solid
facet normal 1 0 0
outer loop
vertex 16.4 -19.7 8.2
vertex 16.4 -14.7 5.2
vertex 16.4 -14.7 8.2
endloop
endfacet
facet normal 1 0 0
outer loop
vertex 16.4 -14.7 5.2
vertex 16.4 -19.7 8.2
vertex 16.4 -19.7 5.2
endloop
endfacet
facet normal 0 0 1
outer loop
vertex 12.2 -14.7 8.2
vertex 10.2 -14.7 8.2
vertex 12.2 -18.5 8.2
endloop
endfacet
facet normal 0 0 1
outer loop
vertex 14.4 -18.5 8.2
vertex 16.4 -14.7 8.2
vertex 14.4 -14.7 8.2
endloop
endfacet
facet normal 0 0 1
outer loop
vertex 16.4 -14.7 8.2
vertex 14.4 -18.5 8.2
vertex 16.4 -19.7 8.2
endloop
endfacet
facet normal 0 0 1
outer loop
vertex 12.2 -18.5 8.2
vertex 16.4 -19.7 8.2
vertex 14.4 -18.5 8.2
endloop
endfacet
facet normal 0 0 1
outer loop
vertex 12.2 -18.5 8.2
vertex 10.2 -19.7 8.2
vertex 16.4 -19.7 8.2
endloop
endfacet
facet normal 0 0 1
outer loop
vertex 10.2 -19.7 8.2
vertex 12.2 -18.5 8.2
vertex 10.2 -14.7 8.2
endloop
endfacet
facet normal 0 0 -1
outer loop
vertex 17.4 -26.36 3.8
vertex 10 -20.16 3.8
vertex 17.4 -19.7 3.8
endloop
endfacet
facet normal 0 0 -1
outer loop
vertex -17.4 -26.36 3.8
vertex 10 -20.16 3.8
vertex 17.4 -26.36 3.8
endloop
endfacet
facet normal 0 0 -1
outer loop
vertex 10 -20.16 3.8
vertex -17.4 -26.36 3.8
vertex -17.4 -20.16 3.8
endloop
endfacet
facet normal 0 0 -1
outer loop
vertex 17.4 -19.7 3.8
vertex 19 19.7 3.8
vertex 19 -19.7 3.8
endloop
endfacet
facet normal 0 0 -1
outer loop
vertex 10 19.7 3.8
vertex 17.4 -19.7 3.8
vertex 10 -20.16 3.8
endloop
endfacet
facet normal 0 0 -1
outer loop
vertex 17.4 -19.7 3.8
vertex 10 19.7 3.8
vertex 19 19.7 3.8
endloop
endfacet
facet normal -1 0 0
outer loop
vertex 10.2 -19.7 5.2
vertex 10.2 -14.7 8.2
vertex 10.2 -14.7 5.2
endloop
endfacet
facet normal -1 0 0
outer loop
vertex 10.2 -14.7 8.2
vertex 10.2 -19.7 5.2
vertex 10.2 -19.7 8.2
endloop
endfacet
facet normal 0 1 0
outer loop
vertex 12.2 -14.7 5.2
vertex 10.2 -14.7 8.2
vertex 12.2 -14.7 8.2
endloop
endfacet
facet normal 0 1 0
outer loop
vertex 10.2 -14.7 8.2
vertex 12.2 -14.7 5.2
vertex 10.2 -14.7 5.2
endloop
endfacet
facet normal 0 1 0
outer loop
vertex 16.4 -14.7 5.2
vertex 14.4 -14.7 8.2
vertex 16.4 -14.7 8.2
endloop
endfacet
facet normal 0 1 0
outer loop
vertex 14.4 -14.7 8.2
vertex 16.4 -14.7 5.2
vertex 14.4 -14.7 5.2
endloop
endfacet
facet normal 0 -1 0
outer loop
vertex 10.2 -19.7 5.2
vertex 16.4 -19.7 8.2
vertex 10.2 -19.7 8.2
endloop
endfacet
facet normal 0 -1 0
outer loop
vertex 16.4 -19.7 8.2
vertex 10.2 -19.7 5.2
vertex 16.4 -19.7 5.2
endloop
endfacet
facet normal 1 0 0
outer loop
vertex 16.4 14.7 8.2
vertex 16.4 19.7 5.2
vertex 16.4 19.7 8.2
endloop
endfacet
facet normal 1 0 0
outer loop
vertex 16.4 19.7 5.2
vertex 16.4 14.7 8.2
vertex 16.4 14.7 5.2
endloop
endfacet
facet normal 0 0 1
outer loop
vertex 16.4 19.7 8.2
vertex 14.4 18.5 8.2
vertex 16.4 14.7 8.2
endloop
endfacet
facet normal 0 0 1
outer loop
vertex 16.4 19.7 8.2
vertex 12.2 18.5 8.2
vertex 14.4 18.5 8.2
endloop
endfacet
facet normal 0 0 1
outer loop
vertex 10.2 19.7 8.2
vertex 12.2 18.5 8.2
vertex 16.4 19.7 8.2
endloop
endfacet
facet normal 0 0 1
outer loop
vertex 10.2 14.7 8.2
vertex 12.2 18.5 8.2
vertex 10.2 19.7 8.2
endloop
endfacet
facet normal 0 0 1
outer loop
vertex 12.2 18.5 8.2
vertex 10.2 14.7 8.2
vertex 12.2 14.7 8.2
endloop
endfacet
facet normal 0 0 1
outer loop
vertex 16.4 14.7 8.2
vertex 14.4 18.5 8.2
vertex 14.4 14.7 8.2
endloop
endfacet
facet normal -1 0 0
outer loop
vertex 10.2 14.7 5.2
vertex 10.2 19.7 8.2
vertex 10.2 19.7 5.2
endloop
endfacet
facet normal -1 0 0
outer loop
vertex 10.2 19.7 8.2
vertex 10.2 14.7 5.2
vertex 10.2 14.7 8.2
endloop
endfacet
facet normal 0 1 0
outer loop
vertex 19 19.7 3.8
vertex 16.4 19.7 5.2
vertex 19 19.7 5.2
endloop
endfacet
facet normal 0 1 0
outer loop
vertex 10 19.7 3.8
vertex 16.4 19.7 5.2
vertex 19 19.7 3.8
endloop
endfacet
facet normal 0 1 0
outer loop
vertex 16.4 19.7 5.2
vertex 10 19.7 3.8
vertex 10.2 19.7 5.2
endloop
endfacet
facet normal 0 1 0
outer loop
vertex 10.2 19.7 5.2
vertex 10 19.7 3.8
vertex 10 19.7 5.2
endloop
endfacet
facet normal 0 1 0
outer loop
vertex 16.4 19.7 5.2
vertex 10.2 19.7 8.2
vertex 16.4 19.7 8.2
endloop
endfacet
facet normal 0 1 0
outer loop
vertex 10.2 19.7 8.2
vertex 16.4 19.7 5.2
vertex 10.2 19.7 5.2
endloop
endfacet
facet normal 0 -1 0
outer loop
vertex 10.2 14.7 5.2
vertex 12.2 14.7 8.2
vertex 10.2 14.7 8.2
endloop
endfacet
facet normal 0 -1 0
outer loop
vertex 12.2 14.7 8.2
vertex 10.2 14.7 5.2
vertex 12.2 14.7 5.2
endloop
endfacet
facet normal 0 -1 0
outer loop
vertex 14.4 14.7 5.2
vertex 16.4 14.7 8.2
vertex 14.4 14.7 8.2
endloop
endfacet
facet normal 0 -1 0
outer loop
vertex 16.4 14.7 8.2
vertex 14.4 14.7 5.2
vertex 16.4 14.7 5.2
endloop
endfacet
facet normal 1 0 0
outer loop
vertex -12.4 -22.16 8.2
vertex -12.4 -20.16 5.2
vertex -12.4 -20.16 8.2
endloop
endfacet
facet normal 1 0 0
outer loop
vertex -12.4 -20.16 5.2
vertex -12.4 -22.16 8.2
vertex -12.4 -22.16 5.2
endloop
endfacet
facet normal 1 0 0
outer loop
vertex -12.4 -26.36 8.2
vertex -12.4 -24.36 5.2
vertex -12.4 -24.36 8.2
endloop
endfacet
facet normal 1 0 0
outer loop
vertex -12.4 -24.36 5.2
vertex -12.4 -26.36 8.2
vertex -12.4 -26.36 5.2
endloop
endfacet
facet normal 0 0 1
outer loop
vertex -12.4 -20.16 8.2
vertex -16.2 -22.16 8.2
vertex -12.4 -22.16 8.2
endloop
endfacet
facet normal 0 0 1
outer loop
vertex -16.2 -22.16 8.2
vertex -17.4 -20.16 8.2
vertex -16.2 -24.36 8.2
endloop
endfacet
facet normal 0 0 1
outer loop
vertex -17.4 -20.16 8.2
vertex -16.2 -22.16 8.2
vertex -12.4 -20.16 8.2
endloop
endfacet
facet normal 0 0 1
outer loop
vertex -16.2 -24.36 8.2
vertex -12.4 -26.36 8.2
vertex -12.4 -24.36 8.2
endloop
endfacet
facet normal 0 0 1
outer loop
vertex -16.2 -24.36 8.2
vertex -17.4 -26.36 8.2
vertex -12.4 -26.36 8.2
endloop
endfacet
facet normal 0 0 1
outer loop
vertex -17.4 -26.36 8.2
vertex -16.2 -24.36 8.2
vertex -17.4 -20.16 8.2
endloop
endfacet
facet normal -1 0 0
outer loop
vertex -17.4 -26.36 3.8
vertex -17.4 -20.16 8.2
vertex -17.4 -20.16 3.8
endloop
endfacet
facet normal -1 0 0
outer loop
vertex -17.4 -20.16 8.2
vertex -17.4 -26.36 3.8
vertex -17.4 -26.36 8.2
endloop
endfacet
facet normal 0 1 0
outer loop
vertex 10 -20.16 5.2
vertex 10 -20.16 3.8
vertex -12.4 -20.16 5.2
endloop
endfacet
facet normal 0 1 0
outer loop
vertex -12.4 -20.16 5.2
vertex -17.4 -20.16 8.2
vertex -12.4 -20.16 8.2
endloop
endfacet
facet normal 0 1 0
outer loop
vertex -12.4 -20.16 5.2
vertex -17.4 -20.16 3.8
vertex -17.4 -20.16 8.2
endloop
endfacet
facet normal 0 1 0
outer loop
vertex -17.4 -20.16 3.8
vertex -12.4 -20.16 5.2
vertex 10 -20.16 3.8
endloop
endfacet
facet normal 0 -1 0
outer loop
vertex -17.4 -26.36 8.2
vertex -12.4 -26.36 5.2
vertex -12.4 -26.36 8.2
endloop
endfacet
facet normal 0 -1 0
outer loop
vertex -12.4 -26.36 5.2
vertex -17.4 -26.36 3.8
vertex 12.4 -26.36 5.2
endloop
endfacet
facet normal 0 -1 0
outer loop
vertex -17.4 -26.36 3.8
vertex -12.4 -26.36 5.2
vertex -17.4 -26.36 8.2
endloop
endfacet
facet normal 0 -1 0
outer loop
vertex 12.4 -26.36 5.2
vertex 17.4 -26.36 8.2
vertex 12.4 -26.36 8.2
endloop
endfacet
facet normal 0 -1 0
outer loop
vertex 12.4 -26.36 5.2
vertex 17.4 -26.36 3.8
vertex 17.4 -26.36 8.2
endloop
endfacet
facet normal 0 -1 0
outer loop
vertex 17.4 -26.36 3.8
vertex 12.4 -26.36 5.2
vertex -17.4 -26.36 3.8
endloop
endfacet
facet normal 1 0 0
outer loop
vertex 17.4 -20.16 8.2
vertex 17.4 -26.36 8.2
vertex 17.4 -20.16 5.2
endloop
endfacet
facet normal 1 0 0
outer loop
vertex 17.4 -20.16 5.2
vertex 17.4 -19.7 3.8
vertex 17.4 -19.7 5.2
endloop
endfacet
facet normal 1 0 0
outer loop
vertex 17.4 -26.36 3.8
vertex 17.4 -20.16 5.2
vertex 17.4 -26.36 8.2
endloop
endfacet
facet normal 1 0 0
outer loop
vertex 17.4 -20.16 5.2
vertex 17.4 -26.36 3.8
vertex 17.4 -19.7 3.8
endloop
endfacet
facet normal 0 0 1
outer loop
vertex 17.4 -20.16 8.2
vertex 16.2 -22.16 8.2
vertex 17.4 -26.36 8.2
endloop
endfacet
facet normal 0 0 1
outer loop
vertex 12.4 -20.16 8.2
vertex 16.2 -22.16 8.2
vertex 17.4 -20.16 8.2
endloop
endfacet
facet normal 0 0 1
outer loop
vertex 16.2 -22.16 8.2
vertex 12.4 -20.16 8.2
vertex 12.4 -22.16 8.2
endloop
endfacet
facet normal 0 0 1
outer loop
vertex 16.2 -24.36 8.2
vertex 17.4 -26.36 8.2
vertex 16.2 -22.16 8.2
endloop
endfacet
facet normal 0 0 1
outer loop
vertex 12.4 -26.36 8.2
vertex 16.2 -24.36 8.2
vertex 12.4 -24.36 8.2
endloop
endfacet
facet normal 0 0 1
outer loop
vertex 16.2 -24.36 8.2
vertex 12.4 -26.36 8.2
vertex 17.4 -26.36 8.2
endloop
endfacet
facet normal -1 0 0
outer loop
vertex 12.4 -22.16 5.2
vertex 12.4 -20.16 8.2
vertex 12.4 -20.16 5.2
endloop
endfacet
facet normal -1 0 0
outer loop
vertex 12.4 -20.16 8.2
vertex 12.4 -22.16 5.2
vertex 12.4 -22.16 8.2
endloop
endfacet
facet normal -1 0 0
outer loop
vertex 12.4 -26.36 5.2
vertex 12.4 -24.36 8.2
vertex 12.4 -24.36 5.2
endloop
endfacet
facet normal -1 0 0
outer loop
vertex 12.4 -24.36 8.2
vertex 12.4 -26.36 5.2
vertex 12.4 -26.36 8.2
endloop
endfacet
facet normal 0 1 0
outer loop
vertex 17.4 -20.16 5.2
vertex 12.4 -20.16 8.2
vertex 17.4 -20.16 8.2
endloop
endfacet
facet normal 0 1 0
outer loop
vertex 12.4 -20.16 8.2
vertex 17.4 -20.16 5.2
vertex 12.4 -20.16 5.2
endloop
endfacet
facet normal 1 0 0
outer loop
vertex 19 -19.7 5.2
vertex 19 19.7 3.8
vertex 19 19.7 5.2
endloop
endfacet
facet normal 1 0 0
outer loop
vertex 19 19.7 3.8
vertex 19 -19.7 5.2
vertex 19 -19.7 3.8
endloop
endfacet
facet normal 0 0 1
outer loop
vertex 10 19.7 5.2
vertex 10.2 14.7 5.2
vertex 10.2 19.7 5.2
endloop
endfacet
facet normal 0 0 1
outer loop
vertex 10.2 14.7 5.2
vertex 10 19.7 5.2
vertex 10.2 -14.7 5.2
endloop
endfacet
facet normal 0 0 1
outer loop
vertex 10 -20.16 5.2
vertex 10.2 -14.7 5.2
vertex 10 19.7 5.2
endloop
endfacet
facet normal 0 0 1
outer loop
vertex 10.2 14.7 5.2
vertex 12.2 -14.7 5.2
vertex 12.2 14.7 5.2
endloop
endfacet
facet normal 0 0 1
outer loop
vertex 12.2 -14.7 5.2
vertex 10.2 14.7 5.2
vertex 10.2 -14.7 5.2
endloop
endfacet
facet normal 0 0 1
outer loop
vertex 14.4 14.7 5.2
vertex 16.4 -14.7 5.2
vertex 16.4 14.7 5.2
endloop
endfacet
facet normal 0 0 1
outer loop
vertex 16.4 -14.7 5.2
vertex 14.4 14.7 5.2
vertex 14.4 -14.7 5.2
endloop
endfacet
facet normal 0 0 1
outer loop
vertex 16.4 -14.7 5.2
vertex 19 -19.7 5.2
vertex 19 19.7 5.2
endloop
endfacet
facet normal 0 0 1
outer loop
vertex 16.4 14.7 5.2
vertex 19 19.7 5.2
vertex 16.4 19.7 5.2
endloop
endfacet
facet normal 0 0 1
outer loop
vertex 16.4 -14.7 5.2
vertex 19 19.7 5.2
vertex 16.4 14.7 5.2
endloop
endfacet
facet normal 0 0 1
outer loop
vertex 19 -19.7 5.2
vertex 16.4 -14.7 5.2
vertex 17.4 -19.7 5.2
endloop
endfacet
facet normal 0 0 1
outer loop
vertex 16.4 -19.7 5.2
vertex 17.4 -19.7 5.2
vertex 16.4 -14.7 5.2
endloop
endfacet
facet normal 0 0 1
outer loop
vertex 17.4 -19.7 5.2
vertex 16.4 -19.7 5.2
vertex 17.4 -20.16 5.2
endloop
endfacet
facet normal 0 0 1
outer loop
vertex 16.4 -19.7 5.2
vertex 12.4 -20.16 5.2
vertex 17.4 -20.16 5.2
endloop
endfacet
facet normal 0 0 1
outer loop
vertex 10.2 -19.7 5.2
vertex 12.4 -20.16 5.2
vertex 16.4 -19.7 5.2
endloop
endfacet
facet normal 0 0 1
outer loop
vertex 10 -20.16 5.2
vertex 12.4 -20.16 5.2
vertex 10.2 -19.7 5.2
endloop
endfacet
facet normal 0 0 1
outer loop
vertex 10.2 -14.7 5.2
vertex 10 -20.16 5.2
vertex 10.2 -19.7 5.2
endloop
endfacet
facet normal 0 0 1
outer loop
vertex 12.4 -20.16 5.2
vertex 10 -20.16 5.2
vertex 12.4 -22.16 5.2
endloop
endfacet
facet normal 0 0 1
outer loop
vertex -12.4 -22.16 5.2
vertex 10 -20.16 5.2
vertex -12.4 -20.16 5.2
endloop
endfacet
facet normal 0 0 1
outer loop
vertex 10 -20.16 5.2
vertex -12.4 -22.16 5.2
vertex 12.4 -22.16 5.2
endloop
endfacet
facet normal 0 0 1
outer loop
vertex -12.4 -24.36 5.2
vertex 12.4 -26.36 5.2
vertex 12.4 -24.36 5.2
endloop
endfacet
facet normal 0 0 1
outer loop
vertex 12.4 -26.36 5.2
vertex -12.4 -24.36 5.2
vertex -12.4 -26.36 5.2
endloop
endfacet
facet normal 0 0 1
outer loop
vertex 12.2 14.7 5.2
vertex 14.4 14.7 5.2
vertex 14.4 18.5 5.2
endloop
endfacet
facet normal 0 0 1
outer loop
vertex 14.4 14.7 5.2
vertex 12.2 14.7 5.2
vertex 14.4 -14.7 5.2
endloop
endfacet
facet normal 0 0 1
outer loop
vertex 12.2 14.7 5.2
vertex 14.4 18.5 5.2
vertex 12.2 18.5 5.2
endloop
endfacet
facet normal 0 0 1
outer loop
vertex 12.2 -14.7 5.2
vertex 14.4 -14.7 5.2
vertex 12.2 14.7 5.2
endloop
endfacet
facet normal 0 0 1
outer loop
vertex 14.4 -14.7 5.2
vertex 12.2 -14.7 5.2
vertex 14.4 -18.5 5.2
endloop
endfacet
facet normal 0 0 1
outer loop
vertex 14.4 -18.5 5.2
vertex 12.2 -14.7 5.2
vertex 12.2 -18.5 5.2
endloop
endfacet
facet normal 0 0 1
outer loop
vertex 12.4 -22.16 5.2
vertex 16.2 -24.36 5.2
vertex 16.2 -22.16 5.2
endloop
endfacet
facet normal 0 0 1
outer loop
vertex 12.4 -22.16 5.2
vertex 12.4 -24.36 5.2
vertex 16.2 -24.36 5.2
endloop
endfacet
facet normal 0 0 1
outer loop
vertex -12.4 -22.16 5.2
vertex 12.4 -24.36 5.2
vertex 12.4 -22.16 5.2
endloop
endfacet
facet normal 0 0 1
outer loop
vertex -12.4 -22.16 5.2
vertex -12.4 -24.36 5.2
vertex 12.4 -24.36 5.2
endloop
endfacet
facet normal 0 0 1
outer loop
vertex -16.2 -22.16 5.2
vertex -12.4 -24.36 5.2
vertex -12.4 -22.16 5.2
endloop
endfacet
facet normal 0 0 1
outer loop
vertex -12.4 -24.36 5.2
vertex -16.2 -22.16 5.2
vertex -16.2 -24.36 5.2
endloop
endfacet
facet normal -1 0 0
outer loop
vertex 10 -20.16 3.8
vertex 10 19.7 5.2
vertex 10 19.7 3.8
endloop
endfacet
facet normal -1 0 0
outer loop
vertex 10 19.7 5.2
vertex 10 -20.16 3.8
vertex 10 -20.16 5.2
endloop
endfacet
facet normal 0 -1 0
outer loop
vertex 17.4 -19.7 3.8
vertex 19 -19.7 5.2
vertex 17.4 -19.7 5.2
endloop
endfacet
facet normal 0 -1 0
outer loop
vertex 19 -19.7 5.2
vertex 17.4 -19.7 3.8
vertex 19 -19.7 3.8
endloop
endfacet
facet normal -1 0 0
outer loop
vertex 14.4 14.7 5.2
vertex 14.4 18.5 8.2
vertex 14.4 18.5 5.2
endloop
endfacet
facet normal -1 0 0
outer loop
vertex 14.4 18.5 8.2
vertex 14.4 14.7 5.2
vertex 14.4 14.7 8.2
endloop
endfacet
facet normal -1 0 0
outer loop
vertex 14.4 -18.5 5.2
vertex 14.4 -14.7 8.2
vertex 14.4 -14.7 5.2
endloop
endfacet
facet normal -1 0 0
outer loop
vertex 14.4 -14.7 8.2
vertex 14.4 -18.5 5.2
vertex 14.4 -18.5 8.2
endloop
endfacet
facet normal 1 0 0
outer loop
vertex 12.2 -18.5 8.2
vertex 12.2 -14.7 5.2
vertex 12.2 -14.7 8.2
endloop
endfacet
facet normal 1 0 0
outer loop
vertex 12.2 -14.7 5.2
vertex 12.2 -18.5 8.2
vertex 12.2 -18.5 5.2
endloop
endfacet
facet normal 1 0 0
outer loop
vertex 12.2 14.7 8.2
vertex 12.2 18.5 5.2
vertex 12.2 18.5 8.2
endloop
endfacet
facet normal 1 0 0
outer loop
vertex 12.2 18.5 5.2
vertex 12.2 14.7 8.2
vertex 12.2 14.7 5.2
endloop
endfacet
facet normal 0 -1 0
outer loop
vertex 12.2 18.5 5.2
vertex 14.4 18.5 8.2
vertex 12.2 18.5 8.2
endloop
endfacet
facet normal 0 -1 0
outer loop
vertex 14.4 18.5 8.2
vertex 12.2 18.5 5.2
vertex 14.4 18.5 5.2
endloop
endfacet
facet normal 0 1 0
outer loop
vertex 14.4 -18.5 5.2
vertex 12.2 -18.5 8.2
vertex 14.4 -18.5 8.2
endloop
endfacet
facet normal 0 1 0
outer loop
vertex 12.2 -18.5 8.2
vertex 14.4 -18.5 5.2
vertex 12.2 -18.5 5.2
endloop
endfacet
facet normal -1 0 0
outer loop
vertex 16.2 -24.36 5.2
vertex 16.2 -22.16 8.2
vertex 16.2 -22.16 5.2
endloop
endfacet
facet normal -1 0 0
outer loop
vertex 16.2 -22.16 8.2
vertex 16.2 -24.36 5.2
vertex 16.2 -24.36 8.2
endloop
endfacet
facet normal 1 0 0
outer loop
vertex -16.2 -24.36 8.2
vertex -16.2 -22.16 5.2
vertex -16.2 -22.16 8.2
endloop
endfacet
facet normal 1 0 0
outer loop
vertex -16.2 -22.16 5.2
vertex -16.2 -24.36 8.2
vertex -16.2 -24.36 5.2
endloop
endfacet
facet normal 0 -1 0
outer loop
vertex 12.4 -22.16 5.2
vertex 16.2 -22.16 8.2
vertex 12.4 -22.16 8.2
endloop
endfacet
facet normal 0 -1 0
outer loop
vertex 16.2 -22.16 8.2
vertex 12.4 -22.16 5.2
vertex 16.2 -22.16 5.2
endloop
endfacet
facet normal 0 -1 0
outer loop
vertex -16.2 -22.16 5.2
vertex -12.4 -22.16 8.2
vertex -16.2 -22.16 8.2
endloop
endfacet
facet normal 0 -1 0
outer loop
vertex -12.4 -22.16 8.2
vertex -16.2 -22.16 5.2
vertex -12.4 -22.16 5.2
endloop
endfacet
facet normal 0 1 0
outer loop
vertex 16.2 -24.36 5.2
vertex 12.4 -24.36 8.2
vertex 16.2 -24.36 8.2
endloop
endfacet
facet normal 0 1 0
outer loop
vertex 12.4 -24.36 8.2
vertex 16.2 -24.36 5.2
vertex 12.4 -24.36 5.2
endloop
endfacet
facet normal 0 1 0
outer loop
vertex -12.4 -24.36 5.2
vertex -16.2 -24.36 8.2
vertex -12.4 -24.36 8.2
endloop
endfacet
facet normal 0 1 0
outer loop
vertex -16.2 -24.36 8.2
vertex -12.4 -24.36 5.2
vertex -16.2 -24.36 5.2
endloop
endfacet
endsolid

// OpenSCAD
// file: electronics_envelopes.scad
// Space claims for the parts that are bought, not printed, in the tall-box frame.
// Used for fit checks and renders only. ASSUMED sizes are marked.
floor_z  = 4.0;
seat_z   = floor_z + 1.2;          // board bottom edge, = sled_t above the floor

// ULN2003 module, the common 35 x 32 board (ASSUMED, not measured).
// Stands on its 35 mm edge in the plane x = drv_x, chip side facing +X.
drv_l = 35; drv_h = 32; pcb = 1.6;
drv_slot = drv_l + 2.0;            // +-1 mm play on length
drv_x    = 13.3;
drv_front = 8.5;                   // chip, LEDs, JST socket
drv_back  = 2.0;                   // solder joints
bare_edge = 3.0;                   // bottom strip held by the grooves

// 7Semi MCP23017 breakout BO-10180: 31 x 20, 7.14 tall with the JST (published).
// Stands on its 31 mm edge in the plane y = mcp_y, parts facing -Y (to the wall).
mcp_l = 31; mcp_h = 20;
mcp_slot = mcp_l + 1.4;
mcp_y    = -23.26;
mcp_front = 7.14 - pcb;
mcp_back  = 2.0;

module driver_env() {
    translate([drv_x - pcb / 2, -drv_l / 2, seat_z]) cube([pcb, drv_l, drv_h]);
    translate([drv_x - pcb / 2 - drv_back, -drv_l / 2, seat_z + bare_edge]) cube([drv_back, drv_l, drv_h - bare_edge]);
    translate([drv_x + pcb / 2, -drv_l / 2 + 2, seat_z + 5]) cube([drv_front, drv_l - 4, drv_h - 5]);
    // motor plug in the JST, top middle, sticking out +X
    translate([drv_x + pcb / 2, -6, seat_z + drv_h - 11]) cube([14, 12, 9]);
}

module mcp_env() {
    translate([-mcp_l / 2, mcp_y - pcb / 2, seat_z]) cube([mcp_l, pcb, mcp_h]);
    translate([-mcp_l / 2 + 2, mcp_y - pcb / 2 - mcp_front, seat_z + bare_edge]) cube([mcp_l - 4, mcp_front, mcp_h - bare_edge]);
    translate([-mcp_l / 2 + 2, mcp_y + pcb / 2, seat_z + bare_edge]) cube([mcp_l - 4, mcp_back, mcp_h - bare_edge]);
}

// 28BYJ-48 in the tall-box frame (MEASURED sizes from motor_spec.scad)
module motor_env() {
    translate([-7.5, 0, 15.5]) cylinder(d = 28.1, h = 19, $fn = 100);
    translate([0, 0, 34.5]) cylinder(d = 9, h = 2, $fn = 60);
    translate([0, 0, 36.5]) intersection() { cylinder(d = 5, h = 7.5, $fn = 40); translate([-3, -1.5, 0]) cube([6, 3, 7.5]); }   // 3 mm flats, along Y like the cam bore
    for (y = [-17.35, 17.35]) translate([-7.5, y, 33.5]) cylinder(d = 7, h = 1, $fn = 40);
    hull() for (y = [-17.35, 17.35]) translate([-7.5, y, 33.5]) cylinder(d = 7, h = 1, $fn = 40);
    translate([-25, -8, 15.5]) cube([5, 16, 8]);
}
// main file
// Board holders on the box floor for the ULN2003 module and the 7Semi MCP23017
// breakout. outer_box.scad unions them into the box; this file only keeps the
// numbers in one place.
//
// Each board stands on its bottom edge in two short end grooves. The grooves
// touch only the corner mounting-hole areas, because the long edges of both
// boards carry the solder pads.
include <electronics_envelopes.scad>

sled_t      = 1.2;     // base plate under every groove
groove_w    = 2.2;     // PCB 1.6; still fits if the slot prints 0.3 narrow
groove_d    = 3.0;
bracket_len = 5.0;
wall        = 2.0;

sink = 0.2;   // into the box floor, so the union is solid
module bracket(x0, y0, sx, sy) translate([x0, y0, floor_z - sink]) cube([sx, sy, sled_t + groove_d + sink]);

module board_holders() {
    difference() {
        union() {
            // driver strip; wide enough to bridge the floor gutter at x 11..18
            translate([10.0, -drv_slot / 2 - 1.2, floor_z - sink]) cube([9.0, drv_slot + 2.4, sled_t + sink]);
            for (s = [-1, 1])
                bracket(drv_x - groove_w / 2 - wall, s > 0 ? drv_slot / 2 + 1.2 - bracket_len : -drv_slot / 2 - 1.2,
                        groove_w + 2 * wall, bracket_len);
            // MCP strip
            translate([-mcp_slot / 2 - 1.2, mcp_y - groove_w / 2 - wall, floor_z - sink])
                cube([mcp_slot + 2.4, groove_w + 2 * wall, sled_t + sink]);
            for (s = [-1, 1])
                bracket(s > 0 ? mcp_slot / 2 + 1.2 - bracket_len : -mcp_slot / 2 - 1.2, mcp_y - groove_w / 2 - wall,
                        bracket_len, groove_w + 2 * wall);
            // tie between the two strips
            translate([10.0, mcp_y, floor_z - sink]) cube([mcp_slot / 2 + 1.2 - 10.0, -drv_slot / 2 - mcp_y, sled_t + sink]);
        }
        translate([drv_x - groove_w / 2, -drv_slot / 2, seat_z]) cube([groove_w, drv_slot, groove_d + 1]);
        translate([-mcp_slot / 2, mcp_y - groove_w / 2, seat_z]) cube([mcp_slot, groove_w, groove_d + 1]);
    }
}

board_holders();
